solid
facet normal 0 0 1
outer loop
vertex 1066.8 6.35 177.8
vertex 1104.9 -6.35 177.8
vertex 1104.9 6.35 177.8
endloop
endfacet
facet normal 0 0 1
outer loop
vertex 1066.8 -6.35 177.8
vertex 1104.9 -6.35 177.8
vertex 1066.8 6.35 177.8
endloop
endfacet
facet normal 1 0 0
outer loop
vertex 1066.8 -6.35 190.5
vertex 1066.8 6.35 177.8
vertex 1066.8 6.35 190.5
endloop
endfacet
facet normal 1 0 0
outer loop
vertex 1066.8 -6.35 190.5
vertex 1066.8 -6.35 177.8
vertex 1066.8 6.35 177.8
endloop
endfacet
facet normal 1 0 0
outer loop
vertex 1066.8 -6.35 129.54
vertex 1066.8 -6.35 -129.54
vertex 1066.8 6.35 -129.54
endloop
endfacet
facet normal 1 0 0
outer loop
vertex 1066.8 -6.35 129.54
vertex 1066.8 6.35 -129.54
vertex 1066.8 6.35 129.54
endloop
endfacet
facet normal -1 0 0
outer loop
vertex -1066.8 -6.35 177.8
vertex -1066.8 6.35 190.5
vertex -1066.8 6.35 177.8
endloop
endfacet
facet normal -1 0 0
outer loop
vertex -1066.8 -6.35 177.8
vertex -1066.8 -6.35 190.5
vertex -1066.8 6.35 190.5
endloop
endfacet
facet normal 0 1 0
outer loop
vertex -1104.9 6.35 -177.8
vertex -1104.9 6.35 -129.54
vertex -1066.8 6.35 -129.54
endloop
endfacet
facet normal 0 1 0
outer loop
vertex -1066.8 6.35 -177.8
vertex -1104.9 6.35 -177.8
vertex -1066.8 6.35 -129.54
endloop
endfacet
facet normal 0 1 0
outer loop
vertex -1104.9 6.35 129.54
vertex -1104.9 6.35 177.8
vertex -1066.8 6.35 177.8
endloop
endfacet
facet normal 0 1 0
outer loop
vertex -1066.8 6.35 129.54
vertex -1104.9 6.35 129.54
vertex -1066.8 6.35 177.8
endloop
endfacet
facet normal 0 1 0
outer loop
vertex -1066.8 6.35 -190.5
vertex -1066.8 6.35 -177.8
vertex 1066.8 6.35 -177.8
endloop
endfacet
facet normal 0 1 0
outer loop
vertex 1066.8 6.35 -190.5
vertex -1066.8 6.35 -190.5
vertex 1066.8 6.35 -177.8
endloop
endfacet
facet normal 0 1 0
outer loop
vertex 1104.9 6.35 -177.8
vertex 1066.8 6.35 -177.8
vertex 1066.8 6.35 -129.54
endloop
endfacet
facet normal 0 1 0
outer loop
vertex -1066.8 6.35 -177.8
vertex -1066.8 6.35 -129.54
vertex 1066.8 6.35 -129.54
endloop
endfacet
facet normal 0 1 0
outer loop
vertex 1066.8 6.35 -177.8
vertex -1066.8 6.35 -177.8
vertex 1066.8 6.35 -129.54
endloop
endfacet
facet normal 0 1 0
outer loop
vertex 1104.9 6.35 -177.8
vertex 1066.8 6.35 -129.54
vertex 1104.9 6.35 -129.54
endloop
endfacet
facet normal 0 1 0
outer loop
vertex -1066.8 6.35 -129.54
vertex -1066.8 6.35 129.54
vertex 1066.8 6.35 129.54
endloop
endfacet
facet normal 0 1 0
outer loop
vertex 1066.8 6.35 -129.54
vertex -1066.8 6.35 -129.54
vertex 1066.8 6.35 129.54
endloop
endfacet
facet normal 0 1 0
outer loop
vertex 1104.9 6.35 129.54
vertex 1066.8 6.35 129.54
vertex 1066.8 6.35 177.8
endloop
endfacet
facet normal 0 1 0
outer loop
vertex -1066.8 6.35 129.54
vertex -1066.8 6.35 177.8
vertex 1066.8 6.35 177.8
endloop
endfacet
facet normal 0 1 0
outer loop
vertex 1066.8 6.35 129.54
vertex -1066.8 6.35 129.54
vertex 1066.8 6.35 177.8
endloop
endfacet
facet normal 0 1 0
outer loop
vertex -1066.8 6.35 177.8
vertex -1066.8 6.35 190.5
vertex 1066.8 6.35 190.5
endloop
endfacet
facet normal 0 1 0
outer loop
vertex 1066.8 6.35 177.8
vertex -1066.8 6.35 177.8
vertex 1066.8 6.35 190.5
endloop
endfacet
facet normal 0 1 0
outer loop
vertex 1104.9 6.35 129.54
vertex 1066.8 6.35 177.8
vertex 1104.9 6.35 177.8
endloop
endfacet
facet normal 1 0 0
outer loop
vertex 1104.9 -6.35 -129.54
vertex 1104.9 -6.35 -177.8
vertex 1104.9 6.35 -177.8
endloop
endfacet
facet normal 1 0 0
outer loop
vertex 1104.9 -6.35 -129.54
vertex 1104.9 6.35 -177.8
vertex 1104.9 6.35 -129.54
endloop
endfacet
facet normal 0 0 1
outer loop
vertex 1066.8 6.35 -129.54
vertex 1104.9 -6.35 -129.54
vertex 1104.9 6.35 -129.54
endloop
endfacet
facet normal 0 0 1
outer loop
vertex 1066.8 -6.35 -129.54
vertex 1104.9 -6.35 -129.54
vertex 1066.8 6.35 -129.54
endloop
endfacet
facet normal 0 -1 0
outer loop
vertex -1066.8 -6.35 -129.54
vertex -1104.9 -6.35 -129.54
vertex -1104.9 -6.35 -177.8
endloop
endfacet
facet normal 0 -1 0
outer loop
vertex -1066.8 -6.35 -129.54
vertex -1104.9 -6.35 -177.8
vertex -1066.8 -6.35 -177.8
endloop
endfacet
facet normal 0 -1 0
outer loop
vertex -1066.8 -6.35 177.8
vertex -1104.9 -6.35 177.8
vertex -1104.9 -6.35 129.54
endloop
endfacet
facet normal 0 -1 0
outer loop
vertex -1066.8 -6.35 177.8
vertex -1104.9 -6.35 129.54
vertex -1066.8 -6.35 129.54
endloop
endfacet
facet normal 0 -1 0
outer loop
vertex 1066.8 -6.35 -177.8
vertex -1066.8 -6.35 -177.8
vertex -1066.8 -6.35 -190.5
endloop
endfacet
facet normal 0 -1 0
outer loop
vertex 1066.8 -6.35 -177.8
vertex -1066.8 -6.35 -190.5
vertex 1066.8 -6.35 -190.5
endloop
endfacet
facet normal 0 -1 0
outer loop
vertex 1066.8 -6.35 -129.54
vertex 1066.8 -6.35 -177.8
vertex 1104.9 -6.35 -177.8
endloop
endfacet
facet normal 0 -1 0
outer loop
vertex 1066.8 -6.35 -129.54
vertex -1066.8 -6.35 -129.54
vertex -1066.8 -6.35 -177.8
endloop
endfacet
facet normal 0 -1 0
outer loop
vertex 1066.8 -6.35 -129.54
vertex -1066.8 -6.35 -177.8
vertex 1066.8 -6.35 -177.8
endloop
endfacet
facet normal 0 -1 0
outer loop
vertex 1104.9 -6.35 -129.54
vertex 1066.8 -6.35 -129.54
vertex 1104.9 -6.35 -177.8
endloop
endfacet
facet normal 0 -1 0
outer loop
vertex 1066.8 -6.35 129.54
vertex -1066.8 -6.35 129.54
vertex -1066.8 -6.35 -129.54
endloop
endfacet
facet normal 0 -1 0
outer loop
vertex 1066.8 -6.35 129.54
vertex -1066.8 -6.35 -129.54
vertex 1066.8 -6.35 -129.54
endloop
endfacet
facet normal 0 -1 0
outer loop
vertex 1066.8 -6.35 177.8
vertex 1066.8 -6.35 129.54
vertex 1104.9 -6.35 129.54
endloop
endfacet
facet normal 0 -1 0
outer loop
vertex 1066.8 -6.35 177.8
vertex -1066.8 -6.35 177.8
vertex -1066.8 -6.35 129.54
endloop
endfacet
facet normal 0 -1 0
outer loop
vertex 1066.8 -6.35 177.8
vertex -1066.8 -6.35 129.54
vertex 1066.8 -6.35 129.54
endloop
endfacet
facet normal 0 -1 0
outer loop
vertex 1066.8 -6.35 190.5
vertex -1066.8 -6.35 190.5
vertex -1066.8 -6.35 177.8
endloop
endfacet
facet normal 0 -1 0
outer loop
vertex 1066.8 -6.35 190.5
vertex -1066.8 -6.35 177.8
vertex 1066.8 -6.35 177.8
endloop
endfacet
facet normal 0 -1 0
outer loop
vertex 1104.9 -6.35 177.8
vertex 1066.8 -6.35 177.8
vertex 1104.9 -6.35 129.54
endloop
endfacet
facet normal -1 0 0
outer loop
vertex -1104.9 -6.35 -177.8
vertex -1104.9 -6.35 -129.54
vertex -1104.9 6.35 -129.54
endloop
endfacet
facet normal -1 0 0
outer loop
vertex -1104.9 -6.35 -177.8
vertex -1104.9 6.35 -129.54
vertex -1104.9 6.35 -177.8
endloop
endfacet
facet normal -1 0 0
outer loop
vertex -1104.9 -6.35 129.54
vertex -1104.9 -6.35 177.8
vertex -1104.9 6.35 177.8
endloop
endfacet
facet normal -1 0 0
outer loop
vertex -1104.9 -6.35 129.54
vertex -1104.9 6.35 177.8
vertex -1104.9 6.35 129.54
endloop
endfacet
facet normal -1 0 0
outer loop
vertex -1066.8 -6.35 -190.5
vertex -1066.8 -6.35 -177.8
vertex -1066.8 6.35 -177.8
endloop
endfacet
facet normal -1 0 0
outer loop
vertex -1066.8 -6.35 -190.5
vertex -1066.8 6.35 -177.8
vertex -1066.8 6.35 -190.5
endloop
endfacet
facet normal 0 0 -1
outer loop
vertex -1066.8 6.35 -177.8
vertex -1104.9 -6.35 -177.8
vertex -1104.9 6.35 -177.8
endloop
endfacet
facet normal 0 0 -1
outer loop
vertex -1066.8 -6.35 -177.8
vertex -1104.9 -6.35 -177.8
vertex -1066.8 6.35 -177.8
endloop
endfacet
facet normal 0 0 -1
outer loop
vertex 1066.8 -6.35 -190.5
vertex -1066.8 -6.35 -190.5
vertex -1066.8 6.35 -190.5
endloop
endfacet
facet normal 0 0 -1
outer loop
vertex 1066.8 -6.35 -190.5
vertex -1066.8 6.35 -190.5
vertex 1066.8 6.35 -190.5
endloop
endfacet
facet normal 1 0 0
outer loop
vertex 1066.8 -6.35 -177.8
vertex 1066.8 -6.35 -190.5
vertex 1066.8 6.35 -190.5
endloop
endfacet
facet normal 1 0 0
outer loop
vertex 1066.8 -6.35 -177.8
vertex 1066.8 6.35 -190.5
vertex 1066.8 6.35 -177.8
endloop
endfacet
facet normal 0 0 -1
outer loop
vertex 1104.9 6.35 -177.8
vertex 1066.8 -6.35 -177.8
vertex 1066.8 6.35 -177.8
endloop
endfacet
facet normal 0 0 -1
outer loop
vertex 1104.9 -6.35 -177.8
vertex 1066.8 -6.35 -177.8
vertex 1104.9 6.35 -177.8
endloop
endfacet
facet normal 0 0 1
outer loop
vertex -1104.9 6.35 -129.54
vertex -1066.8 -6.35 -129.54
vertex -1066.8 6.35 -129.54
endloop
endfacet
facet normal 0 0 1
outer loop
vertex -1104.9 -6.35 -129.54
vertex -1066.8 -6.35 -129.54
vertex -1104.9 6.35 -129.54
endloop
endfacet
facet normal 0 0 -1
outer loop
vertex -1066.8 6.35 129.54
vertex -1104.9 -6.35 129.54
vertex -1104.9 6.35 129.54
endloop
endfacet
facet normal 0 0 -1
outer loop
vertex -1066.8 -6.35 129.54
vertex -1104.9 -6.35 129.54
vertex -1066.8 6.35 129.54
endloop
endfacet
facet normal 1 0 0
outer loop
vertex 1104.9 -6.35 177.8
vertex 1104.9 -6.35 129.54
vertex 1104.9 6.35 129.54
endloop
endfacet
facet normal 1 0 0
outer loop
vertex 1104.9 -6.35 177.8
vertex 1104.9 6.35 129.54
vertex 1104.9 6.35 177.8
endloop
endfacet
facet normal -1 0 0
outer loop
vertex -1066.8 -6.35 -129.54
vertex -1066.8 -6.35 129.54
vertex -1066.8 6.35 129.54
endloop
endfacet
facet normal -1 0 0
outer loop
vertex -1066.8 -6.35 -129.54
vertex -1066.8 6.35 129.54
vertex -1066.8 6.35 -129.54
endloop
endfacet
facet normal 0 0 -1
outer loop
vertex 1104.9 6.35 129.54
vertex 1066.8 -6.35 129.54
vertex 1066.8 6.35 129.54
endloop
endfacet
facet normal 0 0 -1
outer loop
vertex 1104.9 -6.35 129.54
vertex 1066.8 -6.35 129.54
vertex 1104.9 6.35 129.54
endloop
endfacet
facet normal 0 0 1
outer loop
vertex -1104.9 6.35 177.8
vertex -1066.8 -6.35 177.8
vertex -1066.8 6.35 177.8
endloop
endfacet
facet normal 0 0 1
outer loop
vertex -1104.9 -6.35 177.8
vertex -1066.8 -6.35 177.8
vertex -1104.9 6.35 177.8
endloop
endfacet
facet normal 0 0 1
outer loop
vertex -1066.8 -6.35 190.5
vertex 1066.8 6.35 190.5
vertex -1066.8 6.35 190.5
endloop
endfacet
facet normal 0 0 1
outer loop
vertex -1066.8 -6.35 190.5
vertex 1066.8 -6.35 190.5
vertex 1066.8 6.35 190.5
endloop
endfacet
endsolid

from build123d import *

# Parameters (mm, degrees)
F1_DEPTH = 6.35


with BuildPart() as f1:
    # F0 (on Front) → F1 (new body, symmetric)
    with BuildSketch(Plane.XZ):
        Polygon((0, 190.5), (-1066.8, 190.5), (-1066.8, 177.8), (-1104.9, 177.8), (-1104.9, 129.54), (-1066.8, 129.54), (-1066.8, 0), (-1066.8, -129.54), (-1104.9, -129.54), (-1104.9, -177.8), (-1066.8, -177.8), (-1066.8, -190.5), (0, -190.5), (1066.8, -190.5), (1066.8, -177.8), (1104.9, -177.8), (1104.9, -129.54), (1066.8, -129.54), (1066.8, 0), (1066.8, 129.54), (1104.9, 129.54), (1104.9, 177.8), (1066.8, 177.8), (1066.8, 190.5), align=None)
    extrude(amount=F1_DEPTH, both=True)


solid = f1.part
